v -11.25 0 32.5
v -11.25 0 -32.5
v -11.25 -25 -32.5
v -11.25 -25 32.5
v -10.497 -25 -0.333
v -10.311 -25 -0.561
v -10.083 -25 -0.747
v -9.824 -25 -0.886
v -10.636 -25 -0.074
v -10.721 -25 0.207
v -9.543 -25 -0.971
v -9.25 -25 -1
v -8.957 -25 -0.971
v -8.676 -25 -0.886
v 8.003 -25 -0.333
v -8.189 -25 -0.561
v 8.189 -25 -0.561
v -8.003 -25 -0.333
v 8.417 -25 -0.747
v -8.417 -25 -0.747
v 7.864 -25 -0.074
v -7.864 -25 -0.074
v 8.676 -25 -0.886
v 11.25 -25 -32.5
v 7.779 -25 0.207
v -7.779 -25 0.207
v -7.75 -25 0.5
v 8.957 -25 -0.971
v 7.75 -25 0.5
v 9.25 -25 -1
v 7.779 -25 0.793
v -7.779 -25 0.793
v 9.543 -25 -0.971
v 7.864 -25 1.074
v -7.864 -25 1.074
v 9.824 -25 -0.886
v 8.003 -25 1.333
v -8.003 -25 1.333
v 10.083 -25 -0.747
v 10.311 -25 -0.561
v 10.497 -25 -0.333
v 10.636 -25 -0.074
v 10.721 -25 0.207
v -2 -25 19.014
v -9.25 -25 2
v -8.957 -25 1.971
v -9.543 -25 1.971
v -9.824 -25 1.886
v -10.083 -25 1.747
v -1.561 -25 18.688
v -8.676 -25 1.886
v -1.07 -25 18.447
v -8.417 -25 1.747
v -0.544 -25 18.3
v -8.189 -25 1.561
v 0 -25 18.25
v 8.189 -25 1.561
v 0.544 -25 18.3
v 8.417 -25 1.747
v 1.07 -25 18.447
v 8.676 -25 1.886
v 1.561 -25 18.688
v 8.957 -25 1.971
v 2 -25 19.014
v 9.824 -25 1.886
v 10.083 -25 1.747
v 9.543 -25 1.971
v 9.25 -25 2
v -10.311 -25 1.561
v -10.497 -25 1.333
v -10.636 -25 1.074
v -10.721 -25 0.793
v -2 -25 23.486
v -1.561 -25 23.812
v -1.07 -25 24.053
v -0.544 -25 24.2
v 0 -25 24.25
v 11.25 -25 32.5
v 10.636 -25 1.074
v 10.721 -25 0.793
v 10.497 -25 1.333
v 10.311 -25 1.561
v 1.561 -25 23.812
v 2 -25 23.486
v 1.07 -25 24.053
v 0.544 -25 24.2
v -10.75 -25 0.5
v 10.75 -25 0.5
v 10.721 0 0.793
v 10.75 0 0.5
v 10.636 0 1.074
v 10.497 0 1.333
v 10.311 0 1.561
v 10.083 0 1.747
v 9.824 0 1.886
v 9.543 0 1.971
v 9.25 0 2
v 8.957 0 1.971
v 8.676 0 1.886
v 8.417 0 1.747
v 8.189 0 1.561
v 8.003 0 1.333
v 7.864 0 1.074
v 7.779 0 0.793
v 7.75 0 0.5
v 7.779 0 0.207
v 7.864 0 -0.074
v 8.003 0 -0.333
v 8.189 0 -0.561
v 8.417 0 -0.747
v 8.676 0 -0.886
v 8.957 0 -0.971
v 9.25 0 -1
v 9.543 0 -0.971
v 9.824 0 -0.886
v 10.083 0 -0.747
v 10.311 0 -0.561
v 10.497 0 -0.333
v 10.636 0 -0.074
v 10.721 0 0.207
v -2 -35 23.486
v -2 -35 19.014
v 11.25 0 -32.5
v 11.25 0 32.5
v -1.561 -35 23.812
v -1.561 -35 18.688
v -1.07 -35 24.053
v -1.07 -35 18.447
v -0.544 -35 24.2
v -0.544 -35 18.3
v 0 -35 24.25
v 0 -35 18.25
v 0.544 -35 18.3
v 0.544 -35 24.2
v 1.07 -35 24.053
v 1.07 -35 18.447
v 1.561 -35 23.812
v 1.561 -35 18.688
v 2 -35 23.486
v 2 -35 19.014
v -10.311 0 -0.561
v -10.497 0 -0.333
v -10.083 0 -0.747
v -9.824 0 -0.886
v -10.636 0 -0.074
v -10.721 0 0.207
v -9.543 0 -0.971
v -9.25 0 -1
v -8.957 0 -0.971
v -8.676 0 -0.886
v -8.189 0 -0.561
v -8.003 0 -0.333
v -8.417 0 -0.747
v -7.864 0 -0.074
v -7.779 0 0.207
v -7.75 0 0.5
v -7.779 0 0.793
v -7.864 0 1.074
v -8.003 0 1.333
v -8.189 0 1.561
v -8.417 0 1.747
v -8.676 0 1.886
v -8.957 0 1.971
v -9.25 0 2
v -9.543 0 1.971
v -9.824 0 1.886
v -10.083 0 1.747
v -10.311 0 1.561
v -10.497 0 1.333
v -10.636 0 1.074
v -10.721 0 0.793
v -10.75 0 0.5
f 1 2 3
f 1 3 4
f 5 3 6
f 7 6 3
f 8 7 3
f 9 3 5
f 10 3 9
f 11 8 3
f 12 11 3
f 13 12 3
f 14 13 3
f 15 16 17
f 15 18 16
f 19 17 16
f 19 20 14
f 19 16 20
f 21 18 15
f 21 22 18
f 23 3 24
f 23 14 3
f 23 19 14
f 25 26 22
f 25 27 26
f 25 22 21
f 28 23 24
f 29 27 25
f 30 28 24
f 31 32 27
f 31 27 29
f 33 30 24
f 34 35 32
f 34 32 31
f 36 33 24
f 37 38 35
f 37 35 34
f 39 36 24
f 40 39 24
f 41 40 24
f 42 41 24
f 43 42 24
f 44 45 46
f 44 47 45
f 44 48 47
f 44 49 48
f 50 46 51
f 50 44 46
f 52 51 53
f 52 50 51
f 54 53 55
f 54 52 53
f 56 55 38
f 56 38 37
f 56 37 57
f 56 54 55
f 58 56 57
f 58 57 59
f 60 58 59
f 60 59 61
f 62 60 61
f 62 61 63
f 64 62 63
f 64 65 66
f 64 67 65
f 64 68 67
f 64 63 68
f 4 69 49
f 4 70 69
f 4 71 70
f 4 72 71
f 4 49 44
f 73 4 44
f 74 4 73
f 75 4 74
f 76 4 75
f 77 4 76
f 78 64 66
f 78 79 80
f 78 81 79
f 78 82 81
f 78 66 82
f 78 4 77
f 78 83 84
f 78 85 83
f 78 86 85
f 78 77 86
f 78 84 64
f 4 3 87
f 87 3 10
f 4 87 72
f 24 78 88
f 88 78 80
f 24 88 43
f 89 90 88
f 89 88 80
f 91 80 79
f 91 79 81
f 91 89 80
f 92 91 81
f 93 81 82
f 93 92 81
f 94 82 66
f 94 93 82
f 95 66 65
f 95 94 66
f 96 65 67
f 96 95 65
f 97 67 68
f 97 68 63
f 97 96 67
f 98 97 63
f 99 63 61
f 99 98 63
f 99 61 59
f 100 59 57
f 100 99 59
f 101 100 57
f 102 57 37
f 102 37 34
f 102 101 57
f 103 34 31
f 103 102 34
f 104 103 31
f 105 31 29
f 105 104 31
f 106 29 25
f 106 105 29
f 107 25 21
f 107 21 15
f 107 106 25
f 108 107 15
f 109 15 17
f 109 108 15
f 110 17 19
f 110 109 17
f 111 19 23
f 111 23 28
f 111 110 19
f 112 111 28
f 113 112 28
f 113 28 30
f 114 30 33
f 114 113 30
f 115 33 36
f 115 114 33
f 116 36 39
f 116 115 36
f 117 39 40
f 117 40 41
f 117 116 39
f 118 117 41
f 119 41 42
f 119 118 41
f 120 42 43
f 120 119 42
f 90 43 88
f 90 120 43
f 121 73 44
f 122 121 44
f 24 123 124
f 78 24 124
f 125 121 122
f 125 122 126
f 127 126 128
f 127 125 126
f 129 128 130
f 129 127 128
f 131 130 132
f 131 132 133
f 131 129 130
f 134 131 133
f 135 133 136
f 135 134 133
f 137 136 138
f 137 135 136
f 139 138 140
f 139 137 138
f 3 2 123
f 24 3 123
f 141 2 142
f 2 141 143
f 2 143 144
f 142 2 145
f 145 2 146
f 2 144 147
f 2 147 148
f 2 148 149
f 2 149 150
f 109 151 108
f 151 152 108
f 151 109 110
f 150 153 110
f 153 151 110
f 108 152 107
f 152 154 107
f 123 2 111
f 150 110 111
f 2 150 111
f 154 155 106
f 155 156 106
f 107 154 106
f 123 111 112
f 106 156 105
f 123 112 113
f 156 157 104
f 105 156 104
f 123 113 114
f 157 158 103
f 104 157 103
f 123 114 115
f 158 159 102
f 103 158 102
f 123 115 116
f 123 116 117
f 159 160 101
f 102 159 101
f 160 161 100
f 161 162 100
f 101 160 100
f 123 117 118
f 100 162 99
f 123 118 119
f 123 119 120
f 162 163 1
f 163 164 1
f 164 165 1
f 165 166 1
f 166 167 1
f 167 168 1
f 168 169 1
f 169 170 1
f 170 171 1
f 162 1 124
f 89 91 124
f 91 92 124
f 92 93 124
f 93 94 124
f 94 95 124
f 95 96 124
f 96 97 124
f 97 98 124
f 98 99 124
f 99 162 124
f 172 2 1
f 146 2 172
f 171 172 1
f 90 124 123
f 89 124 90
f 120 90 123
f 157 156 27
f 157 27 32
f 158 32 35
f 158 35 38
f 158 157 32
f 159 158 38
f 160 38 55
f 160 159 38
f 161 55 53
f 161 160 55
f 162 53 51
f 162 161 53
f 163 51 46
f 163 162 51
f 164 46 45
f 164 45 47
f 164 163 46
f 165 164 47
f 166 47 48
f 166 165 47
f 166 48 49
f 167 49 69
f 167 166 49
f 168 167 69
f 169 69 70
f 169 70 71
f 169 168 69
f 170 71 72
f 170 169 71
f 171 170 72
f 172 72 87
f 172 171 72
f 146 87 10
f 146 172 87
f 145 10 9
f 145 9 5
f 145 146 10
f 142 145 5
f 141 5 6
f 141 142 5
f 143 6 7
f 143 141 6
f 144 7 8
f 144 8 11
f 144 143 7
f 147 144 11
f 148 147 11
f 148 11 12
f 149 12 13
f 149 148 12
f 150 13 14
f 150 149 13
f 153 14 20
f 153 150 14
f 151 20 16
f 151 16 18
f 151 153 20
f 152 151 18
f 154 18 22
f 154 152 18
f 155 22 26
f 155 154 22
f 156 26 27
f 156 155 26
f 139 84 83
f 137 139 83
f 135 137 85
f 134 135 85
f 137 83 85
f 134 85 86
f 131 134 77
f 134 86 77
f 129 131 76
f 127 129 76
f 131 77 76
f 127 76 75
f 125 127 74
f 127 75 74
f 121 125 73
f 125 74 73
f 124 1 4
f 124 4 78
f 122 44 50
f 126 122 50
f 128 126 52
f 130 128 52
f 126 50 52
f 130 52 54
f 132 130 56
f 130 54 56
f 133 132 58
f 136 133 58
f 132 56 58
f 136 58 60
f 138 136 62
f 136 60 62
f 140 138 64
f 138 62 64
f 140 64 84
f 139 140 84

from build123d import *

# Parameters (mm, degrees)
F0_W     = 22.5
F0_H     = 65
F0_R     = 1.5
F1_DEPTH = 25
F3_DEPTH = 10


with BuildPart() as f1:
    # F0 (on Front) → F1 (new body)
    with BuildSketch(Plane.XZ):
        Rectangle(F0_W, F0_H)
        with Locations((-9.25, 0.5)):
            Circle(F0_R, mode=Mode.SUBTRACT)
        with Locations((9.25, 0.5)):
            Circle(F0_R, mode=Mode.SUBTRACT)
    extrude(amount=F1_DEPTH)

    # F2 (on face) → F3 (join)
    with BuildSketch(Plane.XZ.offset(25)):
        with BuildLine():
            Line((-2, 23.486068), (-2, 19.013932))
            ThreePointArc((-2, 19.013932), (0, 18.25), (2, 19.013932))
            Line((2, 19.013932), (2, 23.486068))
            ThreePointArc((2, 23.486068), (0, 24.25), (-2, 23.486068))
        make_face()
    extrude(amount=F3_DEPTH)


solid = f1.part
